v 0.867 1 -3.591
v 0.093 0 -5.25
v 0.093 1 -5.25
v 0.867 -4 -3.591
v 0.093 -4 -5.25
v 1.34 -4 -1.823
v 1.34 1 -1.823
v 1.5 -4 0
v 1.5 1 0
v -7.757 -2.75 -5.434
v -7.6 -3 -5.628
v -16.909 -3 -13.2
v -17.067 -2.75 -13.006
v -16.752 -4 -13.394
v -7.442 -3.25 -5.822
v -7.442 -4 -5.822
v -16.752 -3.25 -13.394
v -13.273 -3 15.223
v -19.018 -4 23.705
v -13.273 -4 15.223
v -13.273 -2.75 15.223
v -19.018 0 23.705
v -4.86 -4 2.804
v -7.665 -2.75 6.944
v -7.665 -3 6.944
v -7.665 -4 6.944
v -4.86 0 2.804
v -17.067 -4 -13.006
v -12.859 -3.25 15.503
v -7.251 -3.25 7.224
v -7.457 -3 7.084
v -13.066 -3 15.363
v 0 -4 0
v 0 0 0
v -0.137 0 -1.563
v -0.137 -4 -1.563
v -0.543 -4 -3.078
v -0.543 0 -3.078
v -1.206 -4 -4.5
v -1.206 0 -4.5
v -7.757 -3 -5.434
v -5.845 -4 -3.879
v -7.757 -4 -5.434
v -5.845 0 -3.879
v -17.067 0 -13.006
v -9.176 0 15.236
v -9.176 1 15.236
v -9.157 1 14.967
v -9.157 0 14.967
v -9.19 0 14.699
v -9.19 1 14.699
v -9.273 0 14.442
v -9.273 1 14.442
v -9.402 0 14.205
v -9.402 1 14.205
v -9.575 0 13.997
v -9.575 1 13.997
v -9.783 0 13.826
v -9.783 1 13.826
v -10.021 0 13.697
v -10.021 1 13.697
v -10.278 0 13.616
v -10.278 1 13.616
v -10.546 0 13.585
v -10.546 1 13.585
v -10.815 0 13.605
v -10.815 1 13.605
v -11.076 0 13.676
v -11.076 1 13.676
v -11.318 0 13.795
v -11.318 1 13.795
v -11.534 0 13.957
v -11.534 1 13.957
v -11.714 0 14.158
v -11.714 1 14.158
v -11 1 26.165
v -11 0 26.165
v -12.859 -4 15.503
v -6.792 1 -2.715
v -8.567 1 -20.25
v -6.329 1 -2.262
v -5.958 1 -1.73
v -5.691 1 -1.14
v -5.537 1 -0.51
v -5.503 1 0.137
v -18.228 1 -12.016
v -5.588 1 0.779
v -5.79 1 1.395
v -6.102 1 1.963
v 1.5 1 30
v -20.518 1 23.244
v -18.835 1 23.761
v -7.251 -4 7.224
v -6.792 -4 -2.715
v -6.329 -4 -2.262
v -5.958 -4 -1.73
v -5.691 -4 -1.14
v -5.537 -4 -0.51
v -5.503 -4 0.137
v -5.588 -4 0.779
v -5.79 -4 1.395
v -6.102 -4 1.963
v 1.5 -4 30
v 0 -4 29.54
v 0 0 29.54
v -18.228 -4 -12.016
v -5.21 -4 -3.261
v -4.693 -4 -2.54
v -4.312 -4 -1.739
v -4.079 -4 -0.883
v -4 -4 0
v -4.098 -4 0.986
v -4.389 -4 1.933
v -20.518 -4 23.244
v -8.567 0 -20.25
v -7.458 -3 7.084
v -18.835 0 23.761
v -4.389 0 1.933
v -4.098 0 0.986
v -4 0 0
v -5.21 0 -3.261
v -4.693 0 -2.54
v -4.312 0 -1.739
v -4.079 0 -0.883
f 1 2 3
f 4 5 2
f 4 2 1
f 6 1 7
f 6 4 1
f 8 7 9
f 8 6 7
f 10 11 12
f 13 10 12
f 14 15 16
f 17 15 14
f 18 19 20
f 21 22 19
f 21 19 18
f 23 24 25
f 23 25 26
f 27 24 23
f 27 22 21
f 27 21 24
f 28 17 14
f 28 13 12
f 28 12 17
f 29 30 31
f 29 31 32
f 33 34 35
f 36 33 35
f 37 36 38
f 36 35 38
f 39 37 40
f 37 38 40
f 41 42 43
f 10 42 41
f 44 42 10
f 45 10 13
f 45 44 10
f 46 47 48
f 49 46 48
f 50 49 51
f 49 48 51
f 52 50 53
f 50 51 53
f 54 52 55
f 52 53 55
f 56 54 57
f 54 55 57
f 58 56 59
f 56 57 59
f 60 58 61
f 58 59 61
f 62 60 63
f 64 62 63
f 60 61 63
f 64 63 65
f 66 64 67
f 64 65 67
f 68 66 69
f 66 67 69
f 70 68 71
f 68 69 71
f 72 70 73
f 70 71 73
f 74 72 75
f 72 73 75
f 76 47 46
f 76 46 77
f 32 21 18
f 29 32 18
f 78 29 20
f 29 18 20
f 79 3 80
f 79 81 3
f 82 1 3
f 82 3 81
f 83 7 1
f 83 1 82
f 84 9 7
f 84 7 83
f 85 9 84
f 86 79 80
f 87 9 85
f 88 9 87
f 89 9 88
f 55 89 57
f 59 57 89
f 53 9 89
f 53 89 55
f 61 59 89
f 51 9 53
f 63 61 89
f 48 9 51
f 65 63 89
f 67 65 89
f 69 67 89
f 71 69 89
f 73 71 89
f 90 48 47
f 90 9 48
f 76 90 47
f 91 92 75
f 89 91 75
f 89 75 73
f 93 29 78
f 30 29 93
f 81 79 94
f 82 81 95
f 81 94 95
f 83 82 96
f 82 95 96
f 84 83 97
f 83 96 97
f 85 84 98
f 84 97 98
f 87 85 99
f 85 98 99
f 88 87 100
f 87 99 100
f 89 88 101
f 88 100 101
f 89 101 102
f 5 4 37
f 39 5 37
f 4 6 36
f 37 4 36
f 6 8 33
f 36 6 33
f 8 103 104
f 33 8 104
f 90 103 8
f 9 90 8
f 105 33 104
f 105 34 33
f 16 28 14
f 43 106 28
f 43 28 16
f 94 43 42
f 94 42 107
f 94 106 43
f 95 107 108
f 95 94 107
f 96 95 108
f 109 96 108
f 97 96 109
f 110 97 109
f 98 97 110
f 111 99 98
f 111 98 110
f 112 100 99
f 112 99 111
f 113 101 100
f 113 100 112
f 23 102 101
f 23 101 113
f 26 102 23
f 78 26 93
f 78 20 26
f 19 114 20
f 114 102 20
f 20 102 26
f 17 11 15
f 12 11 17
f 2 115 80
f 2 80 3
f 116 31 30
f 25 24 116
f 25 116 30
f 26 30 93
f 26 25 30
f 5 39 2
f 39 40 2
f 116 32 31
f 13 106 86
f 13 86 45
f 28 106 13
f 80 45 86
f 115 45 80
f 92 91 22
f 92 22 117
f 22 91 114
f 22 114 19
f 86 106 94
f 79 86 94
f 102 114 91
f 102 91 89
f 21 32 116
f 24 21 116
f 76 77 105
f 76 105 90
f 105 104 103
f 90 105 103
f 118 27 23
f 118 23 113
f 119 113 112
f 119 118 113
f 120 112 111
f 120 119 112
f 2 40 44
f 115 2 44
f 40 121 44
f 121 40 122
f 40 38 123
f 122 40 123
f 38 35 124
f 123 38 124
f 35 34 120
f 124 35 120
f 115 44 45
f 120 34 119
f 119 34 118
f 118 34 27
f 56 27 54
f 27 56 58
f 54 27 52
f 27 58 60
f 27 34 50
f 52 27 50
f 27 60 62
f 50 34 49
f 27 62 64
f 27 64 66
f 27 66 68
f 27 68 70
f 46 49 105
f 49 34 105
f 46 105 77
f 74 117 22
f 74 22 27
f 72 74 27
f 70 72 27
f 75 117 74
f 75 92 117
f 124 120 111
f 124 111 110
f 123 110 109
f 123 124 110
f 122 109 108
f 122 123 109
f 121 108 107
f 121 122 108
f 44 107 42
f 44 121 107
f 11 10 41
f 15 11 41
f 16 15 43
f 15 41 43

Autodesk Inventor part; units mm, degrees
ref_plane "YZ Plane" through (0, 0, 0) normal (1, 0, 0) x (0, 1, 0)
ref_plane "XZ Plane" through (0, 0, 0) normal (0, 1, 0) x (-1, 0, 0)
ref_plane "XY Plane" through (0, 0, 0) normal (0, 0, 1) x (1, 0, 0)
sketch "Sketch1" plane through (0, 0, 0) normal (0, 1, 0) x (-1, 0, 0)
  line L0 (0, 0) -> (0, 38)
  arc A0 (23.7631, 30.7092) -> (0, 38) centre (13, 38) ccw
  line L1 (0, 38) -> (13, 38)
  arc A1 (0, 0) -> (1.2058, -4.5) centre (9, 0) ccw
  line L2 (0, 0) -> (9, 0)
  line L3 (0, 0) -> (4, 0)
  arc A2 (4, 0) -> (5.8452, -3.8791) centre (9, 0) ccw
  arc A3 (4.8604, 2.8042) -> (4, 0) centre (9, 0) ccw
  line L4 (23.7631, 30.7092) -> (4.8604, 2.8042)
  line L5 (1.2058, -4.5) -> (12.7058, -24.4186)
  line L6 (12.7058, -24.4186) -> (17.9019, -21.4186)
  arc A4 (12.7058, -24.4186) -> (21.6877, -16.7637) centre (17.9019, -21.4186) ccw
  line L7 (5.8452, -3.8791) -> (21.6877, -16.7637)
  line L8 (20.5183, 23.2445) -> (6.1023, 1.9629)
  line L9 (18.2279, -12.0164) -> (6.7916, -2.7153)
  arc A5 (6.1023, 1.9629) -> (6.7916, -2.7153) centre (9, 0) ccw
  line L10 (-1.5, 30) -> (-1.5, 0)
  line L11 (8.567, -20.25) -> (-0.0933, -5.25)
  arc A6 (-1.5, 0) -> (-0.0933, -5.25) centre (9, 0) ccw
  line L12 (18.2279, -12.0164) -> (8.567, -20.25)
  line L13 (20.5183, 23.2445) -> (-1.5, 30)
  line L14 (4.8604, 2.8042) -> (19.0183, 23.7047)
  line L15 (0, 29.5398) -> (0, 0)
  line L16 (5.8452, -3.8791) -> (17.0671, -13.0058)
  line L17 (9.7278, -19.2607) -> (1.2058, -4.5)
  line L18 (1.2058, -4.5) -> (-0.0933, -5.25)
  dimension "d0" = 38
  dimension "d1" = 13
  dimension "d2" = 9
  dimension "d3" = 5
  dimension "d4" = 30
  dimension "d5" = 23
  dimension "d6" = 6
  dimension "d7" = 4
  dimension "d13" = 1.5
  dimension "d14" = 1.5
  dimension "d15" = 79.561
  dimension "d16" = 79.561
  dimension "d17" = 72.943
  dimension "d18" = 72.943
  dimension "d19" = 30
  dimension "d20" = 15
extrude "Extrusion1" add sketch "Sketch1" along normal blind 1 contours A1 L18 A6 L10 L13 L0 | L2 A2 L7 L12 L5 A1 | L0 L13 L4 A3 L2 | L5 L12 L11 L18 | A3 L4 L13 L8 A5 L2 | L2 A5 L9 L12 L7 A2
extrude "Extrusion2" add sketch "Sketch1" against normal blind 4 contours A1 L18 A6 L10 L13 L0 | A3 L4 L13 L8 A5 L2 | L2 A5 L9 L12 L7 A2
sketch "Sketch2" plane through (-5.8452, -4, -3.8791) normal (0.6309641, 0, -0.775812) x (-0.775812, 0, -0.6309641)
  line L0 (14.4647, 0) -> (0, 0) projected
  line L1 (14.4647, 0) -> (2.4647, 0)
  line L2 (2.4647, 1) -> (14.4647, 1)
  line L3 (14.4647, 4) -> (14.4647, 0) projected
  line L4 (14.4647, 0) -> (14.4647, 1)
  line L5 (2.4647, 1) -> (2.4647, 0)
  point P0 (-6.9823, 4)
  dimension "d28" = 12
extrude "Extrusion4" add sketch "Sketch2" along normal blind 0.5
sketch "Sketch3" plane through (-19.0183, -4, 23.7047) normal (0.8279279, 0, 0.5608345) x (0.5608345, 0, -0.8279279)
  line L0 (25.2444, 0) -> (0, 0) projected
  line L1 (20.2444, 0) -> (10.2444, 0)
  line L2 (10.2444, 1) -> (20.2444, 1)
  line L3 (20.2444, 1) -> (20.2444, 0)
  line L4 (10.2444, 1) -> (10.2444, 0)
  point P0 (30.2919, 4)
  dimension "d31" = 10
  dimension "d32" = 5
  dimension "d33" = 1
extrude "Extrusion5" add sketch "Sketch3" along normal blind 0.5
chamfer "Chamfer1" distance 0.25 angle 45 4 edges at (-12.4122, -3, -9.22) (-10.4687, -3, 11.0835) (-10.0547, -3, 11.3639) (-12.0967, -3, -9.6079)
sketch "Sketch4" plane through (0, 1, 0) normal (0, 1, 0) x (1, 0, 0)
  line L0 (-20.5183, -23.2445) -> (1.5, -30) projected
  line L1 (-18.8352, -23.7609) -> (-11.7144, -14.1579)
  arc A0 (-9.1763, -15.2361) -> (-11.7144, -14.1579) centre (-10.5752, -15.0026) ccw
  arc A1 (1.5, 0) -> (0.0933, 5.25) centre (-9, 0) ccw projected
  line L2 (0.0933, 5.25) -> (-10.567, 18.5455)
  line L3 (-8.567, 20.25) -> (-18.2279, 12.0164) projected
  line L4 (-10.567, 18.5455) -> (-8.567, 20.25)
  line L5 (-8.567, 20.25) -> (0.0933, 5.25)
  line L6 (-8.567, 20.25) -> (-10.567, 18.5455)
  line L7 (-9.1763, -15.2361) -> (-11, -26.1648)
  point P0 (0, 0)
  dimension "d42" = 2
extrude "Extrusion6" cut sketch "Sketch4" against normal blind 10 contours L1 A0 L7 L0
equation "\"d0\" = d8"
equation "\"d3\" = d2 - d7"
equation "\"d4\" = d9"
equation "\"d5\" = d10"
equation "\"d6\" = d11"
equation "\"d7\" = d12"
equation "\"d15\" = d16"
equation "\"d17\" = d18"
equation "\"d8\" = 38"
equation "\"d9\" = 30deg"
equation "\"d10\" = 23"
equation "\"d11\" = 6"
equation "\"d12\" = 4"
properties part number "flexible_leg_CS-3_V5_Armor"
